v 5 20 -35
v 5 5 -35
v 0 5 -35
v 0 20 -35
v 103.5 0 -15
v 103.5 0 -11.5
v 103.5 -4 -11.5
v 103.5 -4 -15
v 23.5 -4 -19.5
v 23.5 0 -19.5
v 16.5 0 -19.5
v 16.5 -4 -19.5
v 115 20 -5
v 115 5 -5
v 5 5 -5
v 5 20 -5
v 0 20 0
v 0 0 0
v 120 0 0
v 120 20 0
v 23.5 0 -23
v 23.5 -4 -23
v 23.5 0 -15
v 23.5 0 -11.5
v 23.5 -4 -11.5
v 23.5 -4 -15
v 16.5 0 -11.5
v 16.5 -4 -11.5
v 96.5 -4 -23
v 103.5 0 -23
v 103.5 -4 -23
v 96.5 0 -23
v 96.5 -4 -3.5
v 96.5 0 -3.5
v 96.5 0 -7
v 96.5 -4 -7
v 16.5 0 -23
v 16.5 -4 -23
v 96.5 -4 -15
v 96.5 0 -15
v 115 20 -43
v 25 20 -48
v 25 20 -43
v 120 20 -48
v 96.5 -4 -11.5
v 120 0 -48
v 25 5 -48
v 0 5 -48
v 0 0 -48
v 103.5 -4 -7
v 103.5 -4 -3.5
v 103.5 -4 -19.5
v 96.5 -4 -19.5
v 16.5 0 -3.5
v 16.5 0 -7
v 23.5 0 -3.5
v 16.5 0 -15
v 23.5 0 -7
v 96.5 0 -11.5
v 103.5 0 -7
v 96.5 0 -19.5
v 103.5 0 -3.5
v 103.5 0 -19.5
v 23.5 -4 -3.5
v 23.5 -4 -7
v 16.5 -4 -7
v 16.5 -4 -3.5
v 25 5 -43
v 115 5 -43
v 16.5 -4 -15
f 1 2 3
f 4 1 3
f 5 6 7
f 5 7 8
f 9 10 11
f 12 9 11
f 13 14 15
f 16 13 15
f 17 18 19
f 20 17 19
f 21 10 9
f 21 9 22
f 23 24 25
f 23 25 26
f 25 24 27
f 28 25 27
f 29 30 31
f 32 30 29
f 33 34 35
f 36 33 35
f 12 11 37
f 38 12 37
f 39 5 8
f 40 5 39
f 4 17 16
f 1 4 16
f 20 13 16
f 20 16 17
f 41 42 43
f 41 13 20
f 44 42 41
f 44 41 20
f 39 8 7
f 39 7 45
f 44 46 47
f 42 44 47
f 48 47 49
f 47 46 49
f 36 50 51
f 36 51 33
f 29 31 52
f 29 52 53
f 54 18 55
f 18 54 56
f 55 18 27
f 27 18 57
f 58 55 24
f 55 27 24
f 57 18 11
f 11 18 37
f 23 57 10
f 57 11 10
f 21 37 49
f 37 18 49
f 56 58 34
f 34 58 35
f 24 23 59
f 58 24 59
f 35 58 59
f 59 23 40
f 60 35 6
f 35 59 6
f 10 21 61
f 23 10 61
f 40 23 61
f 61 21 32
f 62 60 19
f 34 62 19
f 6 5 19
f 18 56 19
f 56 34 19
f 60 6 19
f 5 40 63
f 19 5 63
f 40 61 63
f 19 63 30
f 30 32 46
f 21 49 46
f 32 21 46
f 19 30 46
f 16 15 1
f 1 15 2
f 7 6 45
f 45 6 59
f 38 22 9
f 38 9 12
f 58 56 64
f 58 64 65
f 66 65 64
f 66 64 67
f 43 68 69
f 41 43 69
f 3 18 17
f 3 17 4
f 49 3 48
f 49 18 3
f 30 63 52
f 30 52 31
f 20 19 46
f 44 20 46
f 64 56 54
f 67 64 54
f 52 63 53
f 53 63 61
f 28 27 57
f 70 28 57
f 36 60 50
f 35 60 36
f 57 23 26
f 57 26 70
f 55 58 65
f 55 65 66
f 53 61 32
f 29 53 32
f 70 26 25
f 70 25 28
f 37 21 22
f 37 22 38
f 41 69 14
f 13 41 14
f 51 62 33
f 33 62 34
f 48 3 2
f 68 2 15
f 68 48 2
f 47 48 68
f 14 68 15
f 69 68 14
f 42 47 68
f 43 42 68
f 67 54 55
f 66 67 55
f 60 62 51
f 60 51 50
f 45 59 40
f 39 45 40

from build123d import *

# Parameters (mm, degrees)
SKETCH1_W           = 120
SKETCH1_H           = 48
BOSS_EXTRUDE1_DEPTH = 5
BOSS_EXTRUDE2_DEPTH = 15
SKETCH3_W           = 7
SKETCH3_H           = 3.5
BOSS_EXTRUDE3_DEPTH = 4


with BuildPart() as part:
    # Sketch1 → Boss-Extrude1 (new body)
    with BuildSketch(Plane(origin=(0, 0, 0), x_dir=(1, 0, 0), z_dir=(0, 1, 0))):
        with Locations((60, 24)):
            Rectangle(SKETCH1_W, SKETCH1_H)
    extrude(amount=BOSS_EXTRUDE1_DEPTH)

    # Sketch2 → Boss-Extrude2 (add)
    with BuildSketch(Plane(origin=(0, 5, 0), x_dir=(1, 0, 0), z_dir=(0, 1, 0))):
        Polygon((120, 48), (25, 48), (25, 43), (115, 43), (115, 5), (5, 5), (5, 35), (0, 35), (0, 0), (120, 0), align=None)
    extrude(amount=BOSS_EXTRUDE2_DEPTH)

    # Sketch3 → Boss-Extrude3 (add)
    with BuildSketch(Plane(origin=(0, 0, 0), x_dir=(-1, 0, 0), z_dir=(0, -1, 0))):
        with Locations((-100, 21.25)):
            Rectangle(SKETCH3_W, SKETCH3_H)
        with Locations((-100, 13.25)):
            Rectangle(SKETCH3_W, SKETCH3_H)
        with Locations((-100, 5.25)):
            Rectangle(SKETCH3_W, SKETCH3_H)
        with Locations((-20, 21.25)):
            Rectangle(SKETCH3_W, SKETCH3_H)
        with Locations((-20, 13.25)):
            Rectangle(SKETCH3_W, SKETCH3_H)
        with Locations((-20, 5.25)):
            Rectangle(SKETCH3_W, SKETCH3_H)
    extrude(amount=BOSS_EXTRUDE3_DEPTH)


solid = part.part
